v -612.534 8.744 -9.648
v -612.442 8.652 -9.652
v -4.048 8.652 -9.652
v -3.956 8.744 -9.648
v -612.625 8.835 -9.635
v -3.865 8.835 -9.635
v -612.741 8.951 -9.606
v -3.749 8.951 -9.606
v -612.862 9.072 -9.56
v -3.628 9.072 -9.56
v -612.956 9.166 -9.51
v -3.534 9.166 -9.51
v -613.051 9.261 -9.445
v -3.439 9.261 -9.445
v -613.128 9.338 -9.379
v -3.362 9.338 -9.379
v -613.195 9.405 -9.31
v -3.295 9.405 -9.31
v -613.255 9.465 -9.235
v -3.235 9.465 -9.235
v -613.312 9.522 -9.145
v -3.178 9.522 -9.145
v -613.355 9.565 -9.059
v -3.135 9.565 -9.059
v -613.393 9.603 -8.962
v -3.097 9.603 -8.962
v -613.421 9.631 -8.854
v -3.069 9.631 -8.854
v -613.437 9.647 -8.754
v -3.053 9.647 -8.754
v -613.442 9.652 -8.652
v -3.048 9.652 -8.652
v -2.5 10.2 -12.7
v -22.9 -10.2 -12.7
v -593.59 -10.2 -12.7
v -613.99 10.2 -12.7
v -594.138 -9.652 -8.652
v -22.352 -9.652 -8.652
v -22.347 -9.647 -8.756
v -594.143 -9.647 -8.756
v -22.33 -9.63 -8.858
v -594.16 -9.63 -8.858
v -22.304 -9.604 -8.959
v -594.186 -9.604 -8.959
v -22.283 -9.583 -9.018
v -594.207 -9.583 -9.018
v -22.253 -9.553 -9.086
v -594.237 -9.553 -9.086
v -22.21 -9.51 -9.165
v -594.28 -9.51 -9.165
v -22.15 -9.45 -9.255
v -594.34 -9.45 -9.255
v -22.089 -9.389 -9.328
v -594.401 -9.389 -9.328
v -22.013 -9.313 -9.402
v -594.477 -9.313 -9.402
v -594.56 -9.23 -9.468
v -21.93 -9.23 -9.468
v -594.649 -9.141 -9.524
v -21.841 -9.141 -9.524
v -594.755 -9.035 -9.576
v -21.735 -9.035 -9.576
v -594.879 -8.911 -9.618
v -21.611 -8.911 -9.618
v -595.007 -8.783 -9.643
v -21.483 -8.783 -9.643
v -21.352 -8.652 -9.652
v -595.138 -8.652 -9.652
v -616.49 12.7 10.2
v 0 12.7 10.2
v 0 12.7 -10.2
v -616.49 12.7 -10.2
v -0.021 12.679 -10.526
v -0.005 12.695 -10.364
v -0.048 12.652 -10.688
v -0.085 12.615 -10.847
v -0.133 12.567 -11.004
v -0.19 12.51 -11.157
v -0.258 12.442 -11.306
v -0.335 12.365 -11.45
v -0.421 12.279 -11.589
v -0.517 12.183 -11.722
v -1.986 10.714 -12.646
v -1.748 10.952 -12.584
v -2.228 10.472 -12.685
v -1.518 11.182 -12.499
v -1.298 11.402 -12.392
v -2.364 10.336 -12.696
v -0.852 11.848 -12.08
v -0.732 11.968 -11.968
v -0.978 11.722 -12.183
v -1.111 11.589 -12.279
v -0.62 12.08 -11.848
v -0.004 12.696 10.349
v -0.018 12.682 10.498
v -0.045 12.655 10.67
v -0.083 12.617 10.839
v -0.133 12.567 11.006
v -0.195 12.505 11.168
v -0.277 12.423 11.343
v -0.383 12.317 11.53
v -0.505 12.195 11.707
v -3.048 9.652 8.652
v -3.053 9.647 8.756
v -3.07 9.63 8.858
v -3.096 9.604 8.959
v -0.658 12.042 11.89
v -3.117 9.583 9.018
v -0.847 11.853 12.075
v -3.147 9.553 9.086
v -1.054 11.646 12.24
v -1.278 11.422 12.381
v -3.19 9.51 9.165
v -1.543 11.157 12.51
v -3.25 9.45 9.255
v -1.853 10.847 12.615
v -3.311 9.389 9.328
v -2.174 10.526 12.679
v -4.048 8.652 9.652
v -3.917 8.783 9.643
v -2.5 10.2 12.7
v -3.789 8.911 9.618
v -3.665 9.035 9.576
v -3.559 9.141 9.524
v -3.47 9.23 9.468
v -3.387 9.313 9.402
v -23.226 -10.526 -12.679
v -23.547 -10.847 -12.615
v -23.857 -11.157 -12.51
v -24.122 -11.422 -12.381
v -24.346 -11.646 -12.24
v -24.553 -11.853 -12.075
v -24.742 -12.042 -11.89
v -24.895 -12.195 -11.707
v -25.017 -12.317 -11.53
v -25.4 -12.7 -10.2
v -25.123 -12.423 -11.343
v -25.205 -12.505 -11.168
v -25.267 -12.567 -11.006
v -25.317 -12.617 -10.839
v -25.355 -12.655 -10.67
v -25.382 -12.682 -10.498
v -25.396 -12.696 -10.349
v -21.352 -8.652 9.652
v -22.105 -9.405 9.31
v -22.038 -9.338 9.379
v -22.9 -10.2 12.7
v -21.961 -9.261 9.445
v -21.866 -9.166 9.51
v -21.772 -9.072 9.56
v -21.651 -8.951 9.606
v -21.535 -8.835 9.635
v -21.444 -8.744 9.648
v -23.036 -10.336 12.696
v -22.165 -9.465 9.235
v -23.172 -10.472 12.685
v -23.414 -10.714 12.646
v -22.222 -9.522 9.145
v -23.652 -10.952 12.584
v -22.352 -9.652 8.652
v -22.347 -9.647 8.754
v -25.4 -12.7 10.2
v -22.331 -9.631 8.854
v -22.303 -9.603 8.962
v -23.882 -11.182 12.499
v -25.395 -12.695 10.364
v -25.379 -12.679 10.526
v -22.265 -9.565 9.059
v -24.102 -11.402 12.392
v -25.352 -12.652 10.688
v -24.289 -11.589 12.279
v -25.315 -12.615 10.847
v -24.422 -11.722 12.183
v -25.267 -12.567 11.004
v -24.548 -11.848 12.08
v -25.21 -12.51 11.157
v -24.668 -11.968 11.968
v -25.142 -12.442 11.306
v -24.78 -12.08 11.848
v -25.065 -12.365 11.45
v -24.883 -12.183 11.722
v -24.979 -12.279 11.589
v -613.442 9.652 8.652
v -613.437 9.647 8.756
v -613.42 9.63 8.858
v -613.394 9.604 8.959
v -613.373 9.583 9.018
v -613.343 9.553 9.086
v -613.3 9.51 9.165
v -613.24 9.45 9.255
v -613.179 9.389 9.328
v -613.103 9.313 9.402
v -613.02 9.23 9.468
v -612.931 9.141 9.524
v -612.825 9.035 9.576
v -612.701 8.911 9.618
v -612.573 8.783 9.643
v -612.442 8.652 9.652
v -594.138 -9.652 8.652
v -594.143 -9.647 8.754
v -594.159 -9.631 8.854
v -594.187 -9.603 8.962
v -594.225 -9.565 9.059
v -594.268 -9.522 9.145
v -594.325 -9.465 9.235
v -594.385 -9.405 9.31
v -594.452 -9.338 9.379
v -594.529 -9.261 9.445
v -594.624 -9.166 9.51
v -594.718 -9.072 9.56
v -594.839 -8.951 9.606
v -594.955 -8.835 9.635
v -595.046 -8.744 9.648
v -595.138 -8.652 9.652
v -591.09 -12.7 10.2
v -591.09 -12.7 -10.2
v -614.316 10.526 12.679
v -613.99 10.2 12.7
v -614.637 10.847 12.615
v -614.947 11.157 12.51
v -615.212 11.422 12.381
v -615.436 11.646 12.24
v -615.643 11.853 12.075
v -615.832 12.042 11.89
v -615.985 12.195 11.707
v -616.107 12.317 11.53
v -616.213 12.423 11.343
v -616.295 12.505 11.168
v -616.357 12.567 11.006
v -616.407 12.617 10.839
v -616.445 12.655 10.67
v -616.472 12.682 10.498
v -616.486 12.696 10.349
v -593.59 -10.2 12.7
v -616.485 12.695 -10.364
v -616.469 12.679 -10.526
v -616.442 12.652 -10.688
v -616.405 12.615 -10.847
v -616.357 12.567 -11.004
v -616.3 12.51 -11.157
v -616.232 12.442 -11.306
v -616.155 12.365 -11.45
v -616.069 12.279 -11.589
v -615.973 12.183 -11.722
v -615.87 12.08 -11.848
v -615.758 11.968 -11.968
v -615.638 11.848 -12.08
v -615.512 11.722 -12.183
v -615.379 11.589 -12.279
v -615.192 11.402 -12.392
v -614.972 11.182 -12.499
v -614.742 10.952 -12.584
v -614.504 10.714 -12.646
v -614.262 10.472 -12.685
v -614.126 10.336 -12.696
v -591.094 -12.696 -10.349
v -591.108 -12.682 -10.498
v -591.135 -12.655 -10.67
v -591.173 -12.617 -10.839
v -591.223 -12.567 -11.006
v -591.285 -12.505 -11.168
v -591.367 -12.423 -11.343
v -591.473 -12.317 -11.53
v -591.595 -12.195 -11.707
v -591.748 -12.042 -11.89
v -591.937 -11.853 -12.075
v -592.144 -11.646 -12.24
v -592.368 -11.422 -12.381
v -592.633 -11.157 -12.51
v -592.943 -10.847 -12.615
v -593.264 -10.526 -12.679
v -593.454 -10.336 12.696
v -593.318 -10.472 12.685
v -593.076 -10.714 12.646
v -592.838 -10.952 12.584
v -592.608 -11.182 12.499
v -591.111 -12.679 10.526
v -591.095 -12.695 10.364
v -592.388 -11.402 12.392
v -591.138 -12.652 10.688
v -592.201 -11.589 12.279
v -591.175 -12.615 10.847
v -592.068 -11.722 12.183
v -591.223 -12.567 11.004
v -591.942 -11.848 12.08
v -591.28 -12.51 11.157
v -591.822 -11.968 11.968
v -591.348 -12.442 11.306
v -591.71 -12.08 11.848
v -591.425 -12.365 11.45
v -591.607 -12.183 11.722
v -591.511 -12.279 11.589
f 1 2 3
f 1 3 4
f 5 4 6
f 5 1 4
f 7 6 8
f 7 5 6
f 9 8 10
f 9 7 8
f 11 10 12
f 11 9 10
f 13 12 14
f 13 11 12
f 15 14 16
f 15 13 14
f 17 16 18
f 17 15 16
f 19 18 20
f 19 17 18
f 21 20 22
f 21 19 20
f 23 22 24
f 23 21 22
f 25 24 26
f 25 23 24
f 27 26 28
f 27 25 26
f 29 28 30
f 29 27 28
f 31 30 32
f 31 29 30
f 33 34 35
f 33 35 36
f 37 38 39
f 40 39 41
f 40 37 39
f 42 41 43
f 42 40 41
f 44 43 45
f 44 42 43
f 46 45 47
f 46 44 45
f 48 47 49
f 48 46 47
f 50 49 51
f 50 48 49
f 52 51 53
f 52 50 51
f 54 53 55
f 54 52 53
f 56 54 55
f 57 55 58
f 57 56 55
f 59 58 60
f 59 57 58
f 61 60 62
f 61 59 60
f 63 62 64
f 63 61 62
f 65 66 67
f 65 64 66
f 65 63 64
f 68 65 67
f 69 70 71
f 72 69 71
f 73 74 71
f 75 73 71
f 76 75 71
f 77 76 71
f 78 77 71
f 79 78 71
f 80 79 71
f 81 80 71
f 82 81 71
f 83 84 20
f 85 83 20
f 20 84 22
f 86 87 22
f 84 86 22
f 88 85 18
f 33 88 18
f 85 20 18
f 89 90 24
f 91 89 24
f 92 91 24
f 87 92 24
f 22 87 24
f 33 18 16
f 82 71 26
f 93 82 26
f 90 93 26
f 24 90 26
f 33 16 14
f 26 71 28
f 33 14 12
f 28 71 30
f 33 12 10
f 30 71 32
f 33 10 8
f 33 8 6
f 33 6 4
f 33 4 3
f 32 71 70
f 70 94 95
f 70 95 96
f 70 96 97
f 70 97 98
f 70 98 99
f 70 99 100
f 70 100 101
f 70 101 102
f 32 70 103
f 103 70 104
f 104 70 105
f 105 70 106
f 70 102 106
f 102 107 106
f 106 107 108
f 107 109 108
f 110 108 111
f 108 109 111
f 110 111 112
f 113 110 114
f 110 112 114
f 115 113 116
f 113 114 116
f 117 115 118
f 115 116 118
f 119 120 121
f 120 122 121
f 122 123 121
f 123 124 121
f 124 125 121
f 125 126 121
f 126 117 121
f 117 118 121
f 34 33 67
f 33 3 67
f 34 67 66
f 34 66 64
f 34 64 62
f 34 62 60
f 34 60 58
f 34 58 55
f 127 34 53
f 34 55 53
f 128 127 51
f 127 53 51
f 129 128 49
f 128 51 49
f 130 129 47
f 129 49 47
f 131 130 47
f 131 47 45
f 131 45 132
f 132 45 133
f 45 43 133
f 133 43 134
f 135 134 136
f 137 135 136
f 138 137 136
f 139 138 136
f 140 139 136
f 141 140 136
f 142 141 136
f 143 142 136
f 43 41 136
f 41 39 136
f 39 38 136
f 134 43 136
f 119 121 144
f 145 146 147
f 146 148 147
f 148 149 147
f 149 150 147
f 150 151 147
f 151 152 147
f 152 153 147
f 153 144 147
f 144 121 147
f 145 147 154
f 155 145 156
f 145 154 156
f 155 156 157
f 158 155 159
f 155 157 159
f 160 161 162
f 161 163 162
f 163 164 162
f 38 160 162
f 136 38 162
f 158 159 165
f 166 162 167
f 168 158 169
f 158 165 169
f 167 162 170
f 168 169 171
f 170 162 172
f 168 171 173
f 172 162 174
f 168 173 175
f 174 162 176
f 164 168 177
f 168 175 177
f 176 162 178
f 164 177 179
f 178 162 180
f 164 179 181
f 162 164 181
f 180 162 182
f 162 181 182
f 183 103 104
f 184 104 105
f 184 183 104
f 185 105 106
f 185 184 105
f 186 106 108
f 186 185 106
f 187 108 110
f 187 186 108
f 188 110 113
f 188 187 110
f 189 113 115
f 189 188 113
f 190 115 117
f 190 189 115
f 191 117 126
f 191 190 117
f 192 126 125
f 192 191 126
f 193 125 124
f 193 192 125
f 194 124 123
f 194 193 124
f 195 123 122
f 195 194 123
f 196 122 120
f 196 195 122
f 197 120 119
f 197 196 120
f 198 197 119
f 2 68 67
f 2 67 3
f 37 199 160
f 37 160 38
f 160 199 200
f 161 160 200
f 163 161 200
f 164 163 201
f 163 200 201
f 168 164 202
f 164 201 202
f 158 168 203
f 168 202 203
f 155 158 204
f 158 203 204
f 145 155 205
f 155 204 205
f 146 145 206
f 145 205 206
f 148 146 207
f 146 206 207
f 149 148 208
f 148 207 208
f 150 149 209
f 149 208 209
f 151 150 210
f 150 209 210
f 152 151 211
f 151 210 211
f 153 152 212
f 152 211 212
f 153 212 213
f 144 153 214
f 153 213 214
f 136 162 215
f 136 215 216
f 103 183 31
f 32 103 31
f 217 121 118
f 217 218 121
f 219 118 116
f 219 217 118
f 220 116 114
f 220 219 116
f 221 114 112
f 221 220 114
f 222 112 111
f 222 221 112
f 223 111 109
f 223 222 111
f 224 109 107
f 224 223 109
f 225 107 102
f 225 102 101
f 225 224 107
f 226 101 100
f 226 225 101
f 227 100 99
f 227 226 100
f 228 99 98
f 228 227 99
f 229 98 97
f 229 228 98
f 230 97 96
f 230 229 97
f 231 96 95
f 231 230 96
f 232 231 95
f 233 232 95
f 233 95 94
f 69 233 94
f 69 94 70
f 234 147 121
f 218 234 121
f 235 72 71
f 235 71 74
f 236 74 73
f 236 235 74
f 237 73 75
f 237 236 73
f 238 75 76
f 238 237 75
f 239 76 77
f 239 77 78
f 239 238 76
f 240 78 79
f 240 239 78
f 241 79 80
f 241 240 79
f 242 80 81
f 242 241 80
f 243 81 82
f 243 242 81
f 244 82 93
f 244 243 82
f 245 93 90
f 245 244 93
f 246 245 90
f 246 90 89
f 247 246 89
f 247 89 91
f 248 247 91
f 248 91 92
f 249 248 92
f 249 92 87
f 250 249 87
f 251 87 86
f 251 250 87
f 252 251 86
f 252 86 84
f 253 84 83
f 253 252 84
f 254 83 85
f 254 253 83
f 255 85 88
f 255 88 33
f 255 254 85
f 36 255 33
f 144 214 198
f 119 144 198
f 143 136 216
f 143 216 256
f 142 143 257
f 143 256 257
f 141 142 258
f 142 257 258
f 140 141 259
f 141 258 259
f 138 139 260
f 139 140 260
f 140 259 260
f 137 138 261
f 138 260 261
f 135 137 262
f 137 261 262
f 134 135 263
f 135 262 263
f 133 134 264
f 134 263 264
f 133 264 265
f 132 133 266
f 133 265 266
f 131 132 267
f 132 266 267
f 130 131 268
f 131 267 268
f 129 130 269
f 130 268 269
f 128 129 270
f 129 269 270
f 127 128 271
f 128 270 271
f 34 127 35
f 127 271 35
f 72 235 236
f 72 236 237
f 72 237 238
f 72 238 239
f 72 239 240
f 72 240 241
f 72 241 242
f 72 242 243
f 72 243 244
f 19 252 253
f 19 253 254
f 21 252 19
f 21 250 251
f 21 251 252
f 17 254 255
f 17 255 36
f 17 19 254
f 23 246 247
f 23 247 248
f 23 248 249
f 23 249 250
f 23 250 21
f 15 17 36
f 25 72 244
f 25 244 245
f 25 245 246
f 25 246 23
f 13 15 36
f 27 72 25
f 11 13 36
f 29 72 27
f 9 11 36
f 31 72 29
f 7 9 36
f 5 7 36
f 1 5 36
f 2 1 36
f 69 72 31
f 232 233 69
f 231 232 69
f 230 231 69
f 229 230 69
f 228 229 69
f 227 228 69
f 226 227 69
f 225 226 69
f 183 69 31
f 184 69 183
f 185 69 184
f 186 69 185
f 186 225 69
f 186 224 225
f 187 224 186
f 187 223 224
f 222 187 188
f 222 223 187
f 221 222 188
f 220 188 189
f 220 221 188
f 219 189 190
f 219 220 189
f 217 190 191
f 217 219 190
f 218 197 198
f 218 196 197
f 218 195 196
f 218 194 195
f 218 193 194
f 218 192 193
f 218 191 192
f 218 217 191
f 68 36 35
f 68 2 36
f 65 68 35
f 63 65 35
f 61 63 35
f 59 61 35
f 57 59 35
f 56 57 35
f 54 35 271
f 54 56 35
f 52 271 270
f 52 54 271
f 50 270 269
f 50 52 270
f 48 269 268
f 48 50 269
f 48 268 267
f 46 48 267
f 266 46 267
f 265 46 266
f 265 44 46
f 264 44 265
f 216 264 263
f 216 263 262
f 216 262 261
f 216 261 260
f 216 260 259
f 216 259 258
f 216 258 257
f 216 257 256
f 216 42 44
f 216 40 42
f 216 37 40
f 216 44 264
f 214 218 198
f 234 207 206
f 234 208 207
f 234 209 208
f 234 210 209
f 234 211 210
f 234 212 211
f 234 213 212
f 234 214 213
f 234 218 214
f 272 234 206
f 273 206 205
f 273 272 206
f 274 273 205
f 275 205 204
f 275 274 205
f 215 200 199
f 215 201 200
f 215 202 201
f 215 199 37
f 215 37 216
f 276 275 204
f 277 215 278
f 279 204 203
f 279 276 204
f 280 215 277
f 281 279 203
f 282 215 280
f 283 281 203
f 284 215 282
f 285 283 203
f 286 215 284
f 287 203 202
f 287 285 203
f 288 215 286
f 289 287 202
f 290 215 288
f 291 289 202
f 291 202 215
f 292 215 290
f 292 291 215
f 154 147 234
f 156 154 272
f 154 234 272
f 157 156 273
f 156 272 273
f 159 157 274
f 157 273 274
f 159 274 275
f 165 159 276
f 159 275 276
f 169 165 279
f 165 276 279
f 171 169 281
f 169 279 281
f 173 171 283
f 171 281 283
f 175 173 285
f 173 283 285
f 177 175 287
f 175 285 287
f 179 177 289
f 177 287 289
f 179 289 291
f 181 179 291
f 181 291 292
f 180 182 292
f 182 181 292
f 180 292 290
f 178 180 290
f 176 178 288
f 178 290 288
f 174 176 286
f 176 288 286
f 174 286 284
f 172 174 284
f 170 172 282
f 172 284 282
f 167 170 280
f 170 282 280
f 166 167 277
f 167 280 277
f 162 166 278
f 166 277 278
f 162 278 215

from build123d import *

# Parameters (mm, degrees)
SKETCH3_W           = 25.4
SKETCH3_H           = 25.4
SKETCH3_W_2         = 19.304
SKETCH3_H_2         = 19.304
BOSS_EXTRUDE1_DEPTH = 616.49
FILLET1_R           = 2.5
FILLET2_R           = 1
CUT_EXTRUDE1_DEPTH  = 618.143719161


with BuildPart() as part:
    # Sketch3 → Boss-Extrude1 (new body)
    with BuildSketch(Plane(origin=(0, 0, 0), x_dir=(0, 0, -1), z_dir=(1, 0, 0))):
        Rectangle(SKETCH3_W, SKETCH3_H)
        Rectangle(SKETCH3_W_2, SKETCH3_H_2, mode=Mode.SUBTRACT)
    extrude(amount=-BOSS_EXTRUDE1_DEPTH)

    # Fillet1
    fillet1_edges = [part.edges().sort_by_distance(p)[0] for p in [
        (-308.245, -12.7, -12.7),
        (-308.245, -12.7, 12.7),
        (-308.245, 12.7, 12.7),
        (-308.245, 12.7, -12.7),
    ]]
    fillet(fillet1_edges, radius=FILLET1_R)

    # Fillet2
    fillet2_edges = [part.edges().sort_by_distance(p)[0] for p in [
        (-308.245, 9.652, -9.652),
        (-308.245, -9.652, -9.652),
        (-308.245, -9.652, 9.652),
        (-308.245, 9.652, 9.652),
    ]]
    fillet(fillet2_edges, radius=FILLET2_R)

    # Sketch4 → Cut-Extrude1 (cut, through all)
    with BuildSketch(Plane.XY.offset(12.7)):
        Polygon((-616.49, 12.7), (-591.09, -12.7), (-616.49, -12.7), align=None)
        Polygon((0, 12.7), (-25.4, -12.7), (0, -12.7), align=None)
    extrude(amount=-CUT_EXTRUDE1_DEPTH, mode=Mode.SUBTRACT)


solid = part.part
